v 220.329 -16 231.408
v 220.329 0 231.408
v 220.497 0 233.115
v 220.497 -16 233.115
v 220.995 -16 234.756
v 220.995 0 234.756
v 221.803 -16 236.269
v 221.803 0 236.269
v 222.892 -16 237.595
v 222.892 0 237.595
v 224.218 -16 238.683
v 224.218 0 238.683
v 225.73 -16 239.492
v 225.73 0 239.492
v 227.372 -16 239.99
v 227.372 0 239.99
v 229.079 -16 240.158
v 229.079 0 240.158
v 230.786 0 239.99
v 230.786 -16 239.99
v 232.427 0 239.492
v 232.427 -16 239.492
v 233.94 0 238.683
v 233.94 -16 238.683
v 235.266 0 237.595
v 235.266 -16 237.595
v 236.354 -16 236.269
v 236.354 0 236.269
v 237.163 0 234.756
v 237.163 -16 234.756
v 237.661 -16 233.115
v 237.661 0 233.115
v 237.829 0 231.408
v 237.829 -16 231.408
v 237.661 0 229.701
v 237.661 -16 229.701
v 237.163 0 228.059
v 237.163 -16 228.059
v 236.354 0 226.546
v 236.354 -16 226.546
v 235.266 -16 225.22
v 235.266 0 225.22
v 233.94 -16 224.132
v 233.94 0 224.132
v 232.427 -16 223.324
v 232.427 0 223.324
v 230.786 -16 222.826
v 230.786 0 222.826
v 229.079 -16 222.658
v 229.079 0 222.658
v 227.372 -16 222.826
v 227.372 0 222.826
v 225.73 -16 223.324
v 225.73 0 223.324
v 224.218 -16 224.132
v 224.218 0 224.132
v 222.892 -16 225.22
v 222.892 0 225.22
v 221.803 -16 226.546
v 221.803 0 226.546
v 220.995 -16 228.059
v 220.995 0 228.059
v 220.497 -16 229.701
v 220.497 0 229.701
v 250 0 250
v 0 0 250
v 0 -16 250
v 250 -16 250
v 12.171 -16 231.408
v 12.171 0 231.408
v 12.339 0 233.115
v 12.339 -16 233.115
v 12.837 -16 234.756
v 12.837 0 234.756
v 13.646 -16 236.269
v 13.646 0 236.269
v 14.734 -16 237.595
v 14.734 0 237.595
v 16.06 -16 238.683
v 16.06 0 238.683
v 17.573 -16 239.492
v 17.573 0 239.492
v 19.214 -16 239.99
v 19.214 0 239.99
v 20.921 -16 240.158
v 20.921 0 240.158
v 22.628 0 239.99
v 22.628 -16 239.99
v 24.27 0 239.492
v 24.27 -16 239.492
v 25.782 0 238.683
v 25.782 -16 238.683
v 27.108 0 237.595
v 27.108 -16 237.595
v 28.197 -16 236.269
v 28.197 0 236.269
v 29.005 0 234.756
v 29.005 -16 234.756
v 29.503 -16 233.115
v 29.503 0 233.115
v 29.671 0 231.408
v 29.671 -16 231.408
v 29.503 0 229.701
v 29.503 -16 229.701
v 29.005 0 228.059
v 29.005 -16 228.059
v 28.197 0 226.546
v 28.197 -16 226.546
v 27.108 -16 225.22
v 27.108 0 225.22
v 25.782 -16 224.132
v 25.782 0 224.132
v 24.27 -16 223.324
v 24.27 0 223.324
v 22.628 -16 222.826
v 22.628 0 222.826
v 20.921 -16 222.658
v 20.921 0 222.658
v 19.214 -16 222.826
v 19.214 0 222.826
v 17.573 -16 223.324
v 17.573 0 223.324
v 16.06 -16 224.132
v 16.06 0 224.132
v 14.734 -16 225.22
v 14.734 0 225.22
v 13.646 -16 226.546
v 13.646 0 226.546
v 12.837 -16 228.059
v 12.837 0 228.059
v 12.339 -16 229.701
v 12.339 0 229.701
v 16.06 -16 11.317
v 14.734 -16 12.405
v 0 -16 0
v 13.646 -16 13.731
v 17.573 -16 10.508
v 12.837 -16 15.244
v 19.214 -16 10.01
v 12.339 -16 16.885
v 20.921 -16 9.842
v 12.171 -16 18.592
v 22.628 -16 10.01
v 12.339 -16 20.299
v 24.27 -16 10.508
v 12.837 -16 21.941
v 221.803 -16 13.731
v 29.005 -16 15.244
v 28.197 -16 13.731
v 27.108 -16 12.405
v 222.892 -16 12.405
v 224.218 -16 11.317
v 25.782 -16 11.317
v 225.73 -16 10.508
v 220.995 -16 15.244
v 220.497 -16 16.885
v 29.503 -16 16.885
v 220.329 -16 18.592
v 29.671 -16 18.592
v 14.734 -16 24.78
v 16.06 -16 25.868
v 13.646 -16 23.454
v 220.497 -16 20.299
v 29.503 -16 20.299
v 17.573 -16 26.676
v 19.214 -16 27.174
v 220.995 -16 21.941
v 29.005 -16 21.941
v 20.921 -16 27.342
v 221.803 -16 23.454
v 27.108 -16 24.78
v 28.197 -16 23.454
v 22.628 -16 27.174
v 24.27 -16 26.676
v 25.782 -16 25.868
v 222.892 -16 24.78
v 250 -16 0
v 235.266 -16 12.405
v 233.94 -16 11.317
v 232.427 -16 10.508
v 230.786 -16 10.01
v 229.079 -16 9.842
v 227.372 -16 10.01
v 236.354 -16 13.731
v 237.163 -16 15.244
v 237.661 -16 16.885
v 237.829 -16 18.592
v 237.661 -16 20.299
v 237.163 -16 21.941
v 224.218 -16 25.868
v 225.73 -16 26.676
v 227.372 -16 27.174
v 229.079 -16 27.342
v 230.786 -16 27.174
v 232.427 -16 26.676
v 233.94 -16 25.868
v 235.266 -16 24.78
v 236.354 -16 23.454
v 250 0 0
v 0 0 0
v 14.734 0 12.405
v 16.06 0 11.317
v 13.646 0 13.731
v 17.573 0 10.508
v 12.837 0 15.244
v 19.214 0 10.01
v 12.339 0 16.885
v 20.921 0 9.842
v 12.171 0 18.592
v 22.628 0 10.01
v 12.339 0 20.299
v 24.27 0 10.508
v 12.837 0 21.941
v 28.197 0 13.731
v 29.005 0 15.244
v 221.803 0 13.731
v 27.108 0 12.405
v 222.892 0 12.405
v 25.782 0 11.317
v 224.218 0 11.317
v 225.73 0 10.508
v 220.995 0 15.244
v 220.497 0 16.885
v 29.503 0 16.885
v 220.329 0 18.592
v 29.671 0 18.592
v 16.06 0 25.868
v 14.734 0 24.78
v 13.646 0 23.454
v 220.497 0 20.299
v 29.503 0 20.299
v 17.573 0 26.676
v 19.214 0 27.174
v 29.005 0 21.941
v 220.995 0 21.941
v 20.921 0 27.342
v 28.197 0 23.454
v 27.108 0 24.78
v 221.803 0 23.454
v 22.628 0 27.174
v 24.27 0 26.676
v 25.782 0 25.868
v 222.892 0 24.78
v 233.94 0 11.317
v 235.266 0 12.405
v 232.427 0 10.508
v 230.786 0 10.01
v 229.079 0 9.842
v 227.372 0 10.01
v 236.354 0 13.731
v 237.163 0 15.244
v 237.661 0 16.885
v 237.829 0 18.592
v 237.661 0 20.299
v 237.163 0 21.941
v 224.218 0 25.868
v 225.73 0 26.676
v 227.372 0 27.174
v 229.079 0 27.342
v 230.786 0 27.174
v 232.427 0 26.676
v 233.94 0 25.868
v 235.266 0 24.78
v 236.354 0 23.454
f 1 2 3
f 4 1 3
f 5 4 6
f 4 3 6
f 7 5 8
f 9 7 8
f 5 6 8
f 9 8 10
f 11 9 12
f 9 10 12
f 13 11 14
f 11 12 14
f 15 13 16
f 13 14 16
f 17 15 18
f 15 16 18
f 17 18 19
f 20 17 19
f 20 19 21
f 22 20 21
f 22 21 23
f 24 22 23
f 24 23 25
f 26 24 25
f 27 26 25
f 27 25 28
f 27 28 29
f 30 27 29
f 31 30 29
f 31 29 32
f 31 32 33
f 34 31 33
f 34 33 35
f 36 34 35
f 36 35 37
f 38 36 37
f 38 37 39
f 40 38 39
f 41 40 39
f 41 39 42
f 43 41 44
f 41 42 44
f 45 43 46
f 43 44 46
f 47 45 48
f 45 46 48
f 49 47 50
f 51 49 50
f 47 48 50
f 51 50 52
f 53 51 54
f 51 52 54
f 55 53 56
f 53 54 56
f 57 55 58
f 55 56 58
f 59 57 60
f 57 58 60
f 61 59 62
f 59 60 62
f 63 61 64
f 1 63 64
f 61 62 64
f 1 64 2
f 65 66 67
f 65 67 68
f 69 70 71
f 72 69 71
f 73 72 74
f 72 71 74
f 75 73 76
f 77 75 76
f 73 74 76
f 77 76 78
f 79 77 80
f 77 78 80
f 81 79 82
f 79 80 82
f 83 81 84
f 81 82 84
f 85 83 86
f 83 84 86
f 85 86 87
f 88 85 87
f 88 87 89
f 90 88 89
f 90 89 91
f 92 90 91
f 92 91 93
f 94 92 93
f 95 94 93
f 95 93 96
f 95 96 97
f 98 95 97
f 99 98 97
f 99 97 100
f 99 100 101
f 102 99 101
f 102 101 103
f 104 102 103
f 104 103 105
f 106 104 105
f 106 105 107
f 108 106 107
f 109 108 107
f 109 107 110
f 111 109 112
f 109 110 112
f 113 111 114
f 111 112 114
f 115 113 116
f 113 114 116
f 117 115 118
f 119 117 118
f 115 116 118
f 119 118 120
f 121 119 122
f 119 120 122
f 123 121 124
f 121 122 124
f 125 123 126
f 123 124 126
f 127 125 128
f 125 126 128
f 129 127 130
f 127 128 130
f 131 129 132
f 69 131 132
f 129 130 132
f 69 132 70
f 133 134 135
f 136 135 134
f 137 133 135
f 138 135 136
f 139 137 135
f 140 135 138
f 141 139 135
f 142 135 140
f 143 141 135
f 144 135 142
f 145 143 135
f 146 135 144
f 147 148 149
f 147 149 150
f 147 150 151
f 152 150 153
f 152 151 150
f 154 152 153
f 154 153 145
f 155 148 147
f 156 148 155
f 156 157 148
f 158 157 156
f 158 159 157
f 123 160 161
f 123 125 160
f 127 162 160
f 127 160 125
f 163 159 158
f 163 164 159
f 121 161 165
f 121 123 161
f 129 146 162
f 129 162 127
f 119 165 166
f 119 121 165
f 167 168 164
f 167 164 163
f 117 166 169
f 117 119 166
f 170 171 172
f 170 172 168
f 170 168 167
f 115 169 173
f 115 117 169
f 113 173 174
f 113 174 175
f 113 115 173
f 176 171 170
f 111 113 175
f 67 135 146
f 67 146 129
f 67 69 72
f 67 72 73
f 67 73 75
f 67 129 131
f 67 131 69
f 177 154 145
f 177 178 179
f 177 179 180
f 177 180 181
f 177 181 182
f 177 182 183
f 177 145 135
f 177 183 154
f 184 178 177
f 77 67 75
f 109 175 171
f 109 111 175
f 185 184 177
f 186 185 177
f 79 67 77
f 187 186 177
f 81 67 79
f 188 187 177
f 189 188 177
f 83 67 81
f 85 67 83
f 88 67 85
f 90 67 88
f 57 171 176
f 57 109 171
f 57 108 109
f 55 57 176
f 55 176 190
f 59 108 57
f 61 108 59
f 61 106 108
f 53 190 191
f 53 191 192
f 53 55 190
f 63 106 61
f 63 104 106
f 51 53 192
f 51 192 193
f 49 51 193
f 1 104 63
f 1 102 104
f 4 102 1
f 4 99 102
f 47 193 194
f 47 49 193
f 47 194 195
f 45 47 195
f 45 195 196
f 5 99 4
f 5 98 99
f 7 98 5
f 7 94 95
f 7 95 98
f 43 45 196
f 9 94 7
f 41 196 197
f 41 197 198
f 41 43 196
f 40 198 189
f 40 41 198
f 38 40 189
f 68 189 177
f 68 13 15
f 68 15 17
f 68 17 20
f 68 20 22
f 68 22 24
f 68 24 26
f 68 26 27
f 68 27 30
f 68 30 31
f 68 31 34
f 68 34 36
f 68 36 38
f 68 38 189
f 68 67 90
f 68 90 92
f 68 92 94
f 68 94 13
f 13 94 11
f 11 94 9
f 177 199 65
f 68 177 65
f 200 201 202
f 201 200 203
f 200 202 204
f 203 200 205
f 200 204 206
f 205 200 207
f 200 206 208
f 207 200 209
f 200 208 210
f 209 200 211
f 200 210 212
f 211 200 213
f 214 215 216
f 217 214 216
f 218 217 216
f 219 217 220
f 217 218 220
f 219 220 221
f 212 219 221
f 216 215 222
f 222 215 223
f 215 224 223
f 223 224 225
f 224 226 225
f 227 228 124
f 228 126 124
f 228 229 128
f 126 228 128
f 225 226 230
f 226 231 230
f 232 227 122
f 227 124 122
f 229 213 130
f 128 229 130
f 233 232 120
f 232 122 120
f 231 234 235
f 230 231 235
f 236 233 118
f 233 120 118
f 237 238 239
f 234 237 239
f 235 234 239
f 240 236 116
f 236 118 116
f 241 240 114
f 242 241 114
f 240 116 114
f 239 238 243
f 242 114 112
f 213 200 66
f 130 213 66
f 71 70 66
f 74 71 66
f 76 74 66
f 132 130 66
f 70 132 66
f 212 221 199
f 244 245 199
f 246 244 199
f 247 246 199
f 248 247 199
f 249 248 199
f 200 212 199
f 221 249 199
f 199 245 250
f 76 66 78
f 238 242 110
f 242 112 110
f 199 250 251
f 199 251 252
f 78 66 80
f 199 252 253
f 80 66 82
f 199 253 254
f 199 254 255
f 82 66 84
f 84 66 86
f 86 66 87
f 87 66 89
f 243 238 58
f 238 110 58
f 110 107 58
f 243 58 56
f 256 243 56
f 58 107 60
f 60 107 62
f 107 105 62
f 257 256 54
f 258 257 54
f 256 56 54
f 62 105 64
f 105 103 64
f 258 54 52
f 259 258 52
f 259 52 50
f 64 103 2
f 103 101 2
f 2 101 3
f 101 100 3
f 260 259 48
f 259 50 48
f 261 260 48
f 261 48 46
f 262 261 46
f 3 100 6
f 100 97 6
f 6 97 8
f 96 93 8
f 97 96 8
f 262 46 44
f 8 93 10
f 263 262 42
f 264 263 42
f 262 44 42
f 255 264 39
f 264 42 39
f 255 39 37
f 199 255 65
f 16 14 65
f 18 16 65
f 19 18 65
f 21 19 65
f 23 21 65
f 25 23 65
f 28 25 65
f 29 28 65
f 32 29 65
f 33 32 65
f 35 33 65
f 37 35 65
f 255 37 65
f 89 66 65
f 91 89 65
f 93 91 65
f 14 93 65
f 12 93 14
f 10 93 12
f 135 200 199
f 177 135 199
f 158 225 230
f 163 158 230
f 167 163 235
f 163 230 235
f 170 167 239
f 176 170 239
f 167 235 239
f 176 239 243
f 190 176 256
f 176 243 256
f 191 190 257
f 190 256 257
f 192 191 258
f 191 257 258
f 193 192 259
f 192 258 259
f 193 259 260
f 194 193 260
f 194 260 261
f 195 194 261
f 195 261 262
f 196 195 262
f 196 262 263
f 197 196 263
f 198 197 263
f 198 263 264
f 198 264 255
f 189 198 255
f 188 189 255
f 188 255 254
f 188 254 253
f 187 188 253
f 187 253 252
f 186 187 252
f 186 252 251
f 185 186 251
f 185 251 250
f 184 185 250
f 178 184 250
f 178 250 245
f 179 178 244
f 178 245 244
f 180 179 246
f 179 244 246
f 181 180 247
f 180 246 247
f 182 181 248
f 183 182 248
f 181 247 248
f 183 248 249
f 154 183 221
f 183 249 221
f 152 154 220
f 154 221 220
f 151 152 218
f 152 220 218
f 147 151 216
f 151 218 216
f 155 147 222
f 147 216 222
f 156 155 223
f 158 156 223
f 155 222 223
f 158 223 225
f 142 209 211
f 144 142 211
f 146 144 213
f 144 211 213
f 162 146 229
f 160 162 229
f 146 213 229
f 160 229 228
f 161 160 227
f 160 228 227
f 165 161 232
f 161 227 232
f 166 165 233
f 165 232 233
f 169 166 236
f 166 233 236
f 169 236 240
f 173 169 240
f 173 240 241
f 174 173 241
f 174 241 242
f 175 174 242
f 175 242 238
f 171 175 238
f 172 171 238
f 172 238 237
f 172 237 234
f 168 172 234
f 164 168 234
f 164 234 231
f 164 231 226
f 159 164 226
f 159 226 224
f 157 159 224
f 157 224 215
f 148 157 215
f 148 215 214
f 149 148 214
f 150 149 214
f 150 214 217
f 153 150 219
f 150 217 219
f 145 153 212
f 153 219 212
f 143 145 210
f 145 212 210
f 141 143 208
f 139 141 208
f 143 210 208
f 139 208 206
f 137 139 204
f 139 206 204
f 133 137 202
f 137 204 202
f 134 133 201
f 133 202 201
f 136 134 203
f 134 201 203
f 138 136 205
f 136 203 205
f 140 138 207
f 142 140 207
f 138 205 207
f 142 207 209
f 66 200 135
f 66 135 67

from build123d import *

# Parameters (mm, degrees)
F0_W     = 250
F0_H     = 250
F1_DEPTH = 16
F3_D     = 17.5


with BuildPart() as f1:
    # F0 (on Front) → F1 (new body)
    with BuildSketch(Plane.XZ):
        with Locations((125, 125)):
            Rectangle(F0_W, F0_H)
    extrude(amount=F1_DEPTH)

    # F3 (through all)
    with Locations(Plane.XZ.offset(16)):
        with Locations((20.9212601185, 231.4076423645), (20.9212601185, 18.5923576355), (229.0787398815, 18.5923576355), (229.0787398815, 231.4076423645)):
            Hole(F3_D / 2)


solid = f1.part
